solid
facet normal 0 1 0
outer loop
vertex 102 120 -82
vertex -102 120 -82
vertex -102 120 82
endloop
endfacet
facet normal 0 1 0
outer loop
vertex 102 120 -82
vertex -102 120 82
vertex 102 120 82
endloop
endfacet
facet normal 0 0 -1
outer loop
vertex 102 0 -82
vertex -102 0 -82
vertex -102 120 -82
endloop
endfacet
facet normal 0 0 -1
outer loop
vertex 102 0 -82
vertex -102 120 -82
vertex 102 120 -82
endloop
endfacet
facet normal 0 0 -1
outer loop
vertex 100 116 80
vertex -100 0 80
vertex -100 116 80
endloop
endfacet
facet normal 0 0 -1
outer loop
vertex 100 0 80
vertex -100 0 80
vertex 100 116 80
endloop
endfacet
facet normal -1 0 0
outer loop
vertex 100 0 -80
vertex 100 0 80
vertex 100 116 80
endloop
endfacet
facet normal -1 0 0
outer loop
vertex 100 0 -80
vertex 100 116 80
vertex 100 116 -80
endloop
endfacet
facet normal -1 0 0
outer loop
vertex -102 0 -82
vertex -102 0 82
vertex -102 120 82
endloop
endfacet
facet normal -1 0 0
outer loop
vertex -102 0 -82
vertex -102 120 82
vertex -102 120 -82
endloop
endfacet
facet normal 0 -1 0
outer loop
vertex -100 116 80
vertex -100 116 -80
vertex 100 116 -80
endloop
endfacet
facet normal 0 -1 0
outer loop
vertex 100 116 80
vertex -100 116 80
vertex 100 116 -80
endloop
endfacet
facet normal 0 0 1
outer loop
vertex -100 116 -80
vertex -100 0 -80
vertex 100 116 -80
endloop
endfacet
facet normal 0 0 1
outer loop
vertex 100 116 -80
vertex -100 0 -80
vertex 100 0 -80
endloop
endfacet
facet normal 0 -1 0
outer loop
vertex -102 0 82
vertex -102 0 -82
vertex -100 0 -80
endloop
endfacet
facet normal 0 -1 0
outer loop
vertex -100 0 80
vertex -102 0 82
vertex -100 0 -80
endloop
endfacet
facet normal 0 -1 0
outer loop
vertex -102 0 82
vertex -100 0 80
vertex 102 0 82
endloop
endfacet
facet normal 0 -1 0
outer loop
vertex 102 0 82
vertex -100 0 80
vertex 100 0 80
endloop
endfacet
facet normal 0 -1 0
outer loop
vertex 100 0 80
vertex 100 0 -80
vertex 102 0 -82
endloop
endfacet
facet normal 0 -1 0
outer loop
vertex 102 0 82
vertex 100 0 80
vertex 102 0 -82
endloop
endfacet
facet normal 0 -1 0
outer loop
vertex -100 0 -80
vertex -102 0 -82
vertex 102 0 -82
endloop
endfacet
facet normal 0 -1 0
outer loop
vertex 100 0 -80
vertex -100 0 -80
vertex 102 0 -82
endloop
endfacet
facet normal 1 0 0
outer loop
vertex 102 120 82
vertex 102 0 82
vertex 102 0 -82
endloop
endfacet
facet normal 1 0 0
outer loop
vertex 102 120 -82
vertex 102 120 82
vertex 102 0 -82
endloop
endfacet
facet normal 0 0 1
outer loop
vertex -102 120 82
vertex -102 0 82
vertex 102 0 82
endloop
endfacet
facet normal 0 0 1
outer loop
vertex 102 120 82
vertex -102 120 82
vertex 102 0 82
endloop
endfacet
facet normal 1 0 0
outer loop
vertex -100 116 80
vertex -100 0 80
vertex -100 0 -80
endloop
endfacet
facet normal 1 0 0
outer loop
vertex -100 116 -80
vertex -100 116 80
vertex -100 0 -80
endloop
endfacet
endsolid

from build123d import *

# Parameters (mm, degrees)
SKETCH4_W           = 204
SKETCH4_H           = 164
BOSS_EXTRUDE3_DEPTH = 120
SKETCH5_W           = 200
SKETCH5_H           = 160
CUT_EXTRUDE2_DEPTH  = 116


with BuildPart() as part:
    # Sketch4 → Boss-Extrude3 (new body)
    with BuildSketch(Plane(origin=(0, 0, 0), x_dir=(1, 0, 0), z_dir=(0, 1, 0))):
        Rectangle(SKETCH4_W, SKETCH4_H)
    extrude(amount=BOSS_EXTRUDE3_DEPTH)

    # Sketch5 → Cut-Extrude2 (cut)
    with BuildSketch(Plane(origin=(0, 0, 0), x_dir=(1, 0, 0), z_dir=(0, 1, 0))):
        Rectangle(SKETCH5_W, SKETCH5_H)
    extrude(amount=CUT_EXTRUDE2_DEPTH, mode=Mode.SUBTRACT)


solid = part.part
